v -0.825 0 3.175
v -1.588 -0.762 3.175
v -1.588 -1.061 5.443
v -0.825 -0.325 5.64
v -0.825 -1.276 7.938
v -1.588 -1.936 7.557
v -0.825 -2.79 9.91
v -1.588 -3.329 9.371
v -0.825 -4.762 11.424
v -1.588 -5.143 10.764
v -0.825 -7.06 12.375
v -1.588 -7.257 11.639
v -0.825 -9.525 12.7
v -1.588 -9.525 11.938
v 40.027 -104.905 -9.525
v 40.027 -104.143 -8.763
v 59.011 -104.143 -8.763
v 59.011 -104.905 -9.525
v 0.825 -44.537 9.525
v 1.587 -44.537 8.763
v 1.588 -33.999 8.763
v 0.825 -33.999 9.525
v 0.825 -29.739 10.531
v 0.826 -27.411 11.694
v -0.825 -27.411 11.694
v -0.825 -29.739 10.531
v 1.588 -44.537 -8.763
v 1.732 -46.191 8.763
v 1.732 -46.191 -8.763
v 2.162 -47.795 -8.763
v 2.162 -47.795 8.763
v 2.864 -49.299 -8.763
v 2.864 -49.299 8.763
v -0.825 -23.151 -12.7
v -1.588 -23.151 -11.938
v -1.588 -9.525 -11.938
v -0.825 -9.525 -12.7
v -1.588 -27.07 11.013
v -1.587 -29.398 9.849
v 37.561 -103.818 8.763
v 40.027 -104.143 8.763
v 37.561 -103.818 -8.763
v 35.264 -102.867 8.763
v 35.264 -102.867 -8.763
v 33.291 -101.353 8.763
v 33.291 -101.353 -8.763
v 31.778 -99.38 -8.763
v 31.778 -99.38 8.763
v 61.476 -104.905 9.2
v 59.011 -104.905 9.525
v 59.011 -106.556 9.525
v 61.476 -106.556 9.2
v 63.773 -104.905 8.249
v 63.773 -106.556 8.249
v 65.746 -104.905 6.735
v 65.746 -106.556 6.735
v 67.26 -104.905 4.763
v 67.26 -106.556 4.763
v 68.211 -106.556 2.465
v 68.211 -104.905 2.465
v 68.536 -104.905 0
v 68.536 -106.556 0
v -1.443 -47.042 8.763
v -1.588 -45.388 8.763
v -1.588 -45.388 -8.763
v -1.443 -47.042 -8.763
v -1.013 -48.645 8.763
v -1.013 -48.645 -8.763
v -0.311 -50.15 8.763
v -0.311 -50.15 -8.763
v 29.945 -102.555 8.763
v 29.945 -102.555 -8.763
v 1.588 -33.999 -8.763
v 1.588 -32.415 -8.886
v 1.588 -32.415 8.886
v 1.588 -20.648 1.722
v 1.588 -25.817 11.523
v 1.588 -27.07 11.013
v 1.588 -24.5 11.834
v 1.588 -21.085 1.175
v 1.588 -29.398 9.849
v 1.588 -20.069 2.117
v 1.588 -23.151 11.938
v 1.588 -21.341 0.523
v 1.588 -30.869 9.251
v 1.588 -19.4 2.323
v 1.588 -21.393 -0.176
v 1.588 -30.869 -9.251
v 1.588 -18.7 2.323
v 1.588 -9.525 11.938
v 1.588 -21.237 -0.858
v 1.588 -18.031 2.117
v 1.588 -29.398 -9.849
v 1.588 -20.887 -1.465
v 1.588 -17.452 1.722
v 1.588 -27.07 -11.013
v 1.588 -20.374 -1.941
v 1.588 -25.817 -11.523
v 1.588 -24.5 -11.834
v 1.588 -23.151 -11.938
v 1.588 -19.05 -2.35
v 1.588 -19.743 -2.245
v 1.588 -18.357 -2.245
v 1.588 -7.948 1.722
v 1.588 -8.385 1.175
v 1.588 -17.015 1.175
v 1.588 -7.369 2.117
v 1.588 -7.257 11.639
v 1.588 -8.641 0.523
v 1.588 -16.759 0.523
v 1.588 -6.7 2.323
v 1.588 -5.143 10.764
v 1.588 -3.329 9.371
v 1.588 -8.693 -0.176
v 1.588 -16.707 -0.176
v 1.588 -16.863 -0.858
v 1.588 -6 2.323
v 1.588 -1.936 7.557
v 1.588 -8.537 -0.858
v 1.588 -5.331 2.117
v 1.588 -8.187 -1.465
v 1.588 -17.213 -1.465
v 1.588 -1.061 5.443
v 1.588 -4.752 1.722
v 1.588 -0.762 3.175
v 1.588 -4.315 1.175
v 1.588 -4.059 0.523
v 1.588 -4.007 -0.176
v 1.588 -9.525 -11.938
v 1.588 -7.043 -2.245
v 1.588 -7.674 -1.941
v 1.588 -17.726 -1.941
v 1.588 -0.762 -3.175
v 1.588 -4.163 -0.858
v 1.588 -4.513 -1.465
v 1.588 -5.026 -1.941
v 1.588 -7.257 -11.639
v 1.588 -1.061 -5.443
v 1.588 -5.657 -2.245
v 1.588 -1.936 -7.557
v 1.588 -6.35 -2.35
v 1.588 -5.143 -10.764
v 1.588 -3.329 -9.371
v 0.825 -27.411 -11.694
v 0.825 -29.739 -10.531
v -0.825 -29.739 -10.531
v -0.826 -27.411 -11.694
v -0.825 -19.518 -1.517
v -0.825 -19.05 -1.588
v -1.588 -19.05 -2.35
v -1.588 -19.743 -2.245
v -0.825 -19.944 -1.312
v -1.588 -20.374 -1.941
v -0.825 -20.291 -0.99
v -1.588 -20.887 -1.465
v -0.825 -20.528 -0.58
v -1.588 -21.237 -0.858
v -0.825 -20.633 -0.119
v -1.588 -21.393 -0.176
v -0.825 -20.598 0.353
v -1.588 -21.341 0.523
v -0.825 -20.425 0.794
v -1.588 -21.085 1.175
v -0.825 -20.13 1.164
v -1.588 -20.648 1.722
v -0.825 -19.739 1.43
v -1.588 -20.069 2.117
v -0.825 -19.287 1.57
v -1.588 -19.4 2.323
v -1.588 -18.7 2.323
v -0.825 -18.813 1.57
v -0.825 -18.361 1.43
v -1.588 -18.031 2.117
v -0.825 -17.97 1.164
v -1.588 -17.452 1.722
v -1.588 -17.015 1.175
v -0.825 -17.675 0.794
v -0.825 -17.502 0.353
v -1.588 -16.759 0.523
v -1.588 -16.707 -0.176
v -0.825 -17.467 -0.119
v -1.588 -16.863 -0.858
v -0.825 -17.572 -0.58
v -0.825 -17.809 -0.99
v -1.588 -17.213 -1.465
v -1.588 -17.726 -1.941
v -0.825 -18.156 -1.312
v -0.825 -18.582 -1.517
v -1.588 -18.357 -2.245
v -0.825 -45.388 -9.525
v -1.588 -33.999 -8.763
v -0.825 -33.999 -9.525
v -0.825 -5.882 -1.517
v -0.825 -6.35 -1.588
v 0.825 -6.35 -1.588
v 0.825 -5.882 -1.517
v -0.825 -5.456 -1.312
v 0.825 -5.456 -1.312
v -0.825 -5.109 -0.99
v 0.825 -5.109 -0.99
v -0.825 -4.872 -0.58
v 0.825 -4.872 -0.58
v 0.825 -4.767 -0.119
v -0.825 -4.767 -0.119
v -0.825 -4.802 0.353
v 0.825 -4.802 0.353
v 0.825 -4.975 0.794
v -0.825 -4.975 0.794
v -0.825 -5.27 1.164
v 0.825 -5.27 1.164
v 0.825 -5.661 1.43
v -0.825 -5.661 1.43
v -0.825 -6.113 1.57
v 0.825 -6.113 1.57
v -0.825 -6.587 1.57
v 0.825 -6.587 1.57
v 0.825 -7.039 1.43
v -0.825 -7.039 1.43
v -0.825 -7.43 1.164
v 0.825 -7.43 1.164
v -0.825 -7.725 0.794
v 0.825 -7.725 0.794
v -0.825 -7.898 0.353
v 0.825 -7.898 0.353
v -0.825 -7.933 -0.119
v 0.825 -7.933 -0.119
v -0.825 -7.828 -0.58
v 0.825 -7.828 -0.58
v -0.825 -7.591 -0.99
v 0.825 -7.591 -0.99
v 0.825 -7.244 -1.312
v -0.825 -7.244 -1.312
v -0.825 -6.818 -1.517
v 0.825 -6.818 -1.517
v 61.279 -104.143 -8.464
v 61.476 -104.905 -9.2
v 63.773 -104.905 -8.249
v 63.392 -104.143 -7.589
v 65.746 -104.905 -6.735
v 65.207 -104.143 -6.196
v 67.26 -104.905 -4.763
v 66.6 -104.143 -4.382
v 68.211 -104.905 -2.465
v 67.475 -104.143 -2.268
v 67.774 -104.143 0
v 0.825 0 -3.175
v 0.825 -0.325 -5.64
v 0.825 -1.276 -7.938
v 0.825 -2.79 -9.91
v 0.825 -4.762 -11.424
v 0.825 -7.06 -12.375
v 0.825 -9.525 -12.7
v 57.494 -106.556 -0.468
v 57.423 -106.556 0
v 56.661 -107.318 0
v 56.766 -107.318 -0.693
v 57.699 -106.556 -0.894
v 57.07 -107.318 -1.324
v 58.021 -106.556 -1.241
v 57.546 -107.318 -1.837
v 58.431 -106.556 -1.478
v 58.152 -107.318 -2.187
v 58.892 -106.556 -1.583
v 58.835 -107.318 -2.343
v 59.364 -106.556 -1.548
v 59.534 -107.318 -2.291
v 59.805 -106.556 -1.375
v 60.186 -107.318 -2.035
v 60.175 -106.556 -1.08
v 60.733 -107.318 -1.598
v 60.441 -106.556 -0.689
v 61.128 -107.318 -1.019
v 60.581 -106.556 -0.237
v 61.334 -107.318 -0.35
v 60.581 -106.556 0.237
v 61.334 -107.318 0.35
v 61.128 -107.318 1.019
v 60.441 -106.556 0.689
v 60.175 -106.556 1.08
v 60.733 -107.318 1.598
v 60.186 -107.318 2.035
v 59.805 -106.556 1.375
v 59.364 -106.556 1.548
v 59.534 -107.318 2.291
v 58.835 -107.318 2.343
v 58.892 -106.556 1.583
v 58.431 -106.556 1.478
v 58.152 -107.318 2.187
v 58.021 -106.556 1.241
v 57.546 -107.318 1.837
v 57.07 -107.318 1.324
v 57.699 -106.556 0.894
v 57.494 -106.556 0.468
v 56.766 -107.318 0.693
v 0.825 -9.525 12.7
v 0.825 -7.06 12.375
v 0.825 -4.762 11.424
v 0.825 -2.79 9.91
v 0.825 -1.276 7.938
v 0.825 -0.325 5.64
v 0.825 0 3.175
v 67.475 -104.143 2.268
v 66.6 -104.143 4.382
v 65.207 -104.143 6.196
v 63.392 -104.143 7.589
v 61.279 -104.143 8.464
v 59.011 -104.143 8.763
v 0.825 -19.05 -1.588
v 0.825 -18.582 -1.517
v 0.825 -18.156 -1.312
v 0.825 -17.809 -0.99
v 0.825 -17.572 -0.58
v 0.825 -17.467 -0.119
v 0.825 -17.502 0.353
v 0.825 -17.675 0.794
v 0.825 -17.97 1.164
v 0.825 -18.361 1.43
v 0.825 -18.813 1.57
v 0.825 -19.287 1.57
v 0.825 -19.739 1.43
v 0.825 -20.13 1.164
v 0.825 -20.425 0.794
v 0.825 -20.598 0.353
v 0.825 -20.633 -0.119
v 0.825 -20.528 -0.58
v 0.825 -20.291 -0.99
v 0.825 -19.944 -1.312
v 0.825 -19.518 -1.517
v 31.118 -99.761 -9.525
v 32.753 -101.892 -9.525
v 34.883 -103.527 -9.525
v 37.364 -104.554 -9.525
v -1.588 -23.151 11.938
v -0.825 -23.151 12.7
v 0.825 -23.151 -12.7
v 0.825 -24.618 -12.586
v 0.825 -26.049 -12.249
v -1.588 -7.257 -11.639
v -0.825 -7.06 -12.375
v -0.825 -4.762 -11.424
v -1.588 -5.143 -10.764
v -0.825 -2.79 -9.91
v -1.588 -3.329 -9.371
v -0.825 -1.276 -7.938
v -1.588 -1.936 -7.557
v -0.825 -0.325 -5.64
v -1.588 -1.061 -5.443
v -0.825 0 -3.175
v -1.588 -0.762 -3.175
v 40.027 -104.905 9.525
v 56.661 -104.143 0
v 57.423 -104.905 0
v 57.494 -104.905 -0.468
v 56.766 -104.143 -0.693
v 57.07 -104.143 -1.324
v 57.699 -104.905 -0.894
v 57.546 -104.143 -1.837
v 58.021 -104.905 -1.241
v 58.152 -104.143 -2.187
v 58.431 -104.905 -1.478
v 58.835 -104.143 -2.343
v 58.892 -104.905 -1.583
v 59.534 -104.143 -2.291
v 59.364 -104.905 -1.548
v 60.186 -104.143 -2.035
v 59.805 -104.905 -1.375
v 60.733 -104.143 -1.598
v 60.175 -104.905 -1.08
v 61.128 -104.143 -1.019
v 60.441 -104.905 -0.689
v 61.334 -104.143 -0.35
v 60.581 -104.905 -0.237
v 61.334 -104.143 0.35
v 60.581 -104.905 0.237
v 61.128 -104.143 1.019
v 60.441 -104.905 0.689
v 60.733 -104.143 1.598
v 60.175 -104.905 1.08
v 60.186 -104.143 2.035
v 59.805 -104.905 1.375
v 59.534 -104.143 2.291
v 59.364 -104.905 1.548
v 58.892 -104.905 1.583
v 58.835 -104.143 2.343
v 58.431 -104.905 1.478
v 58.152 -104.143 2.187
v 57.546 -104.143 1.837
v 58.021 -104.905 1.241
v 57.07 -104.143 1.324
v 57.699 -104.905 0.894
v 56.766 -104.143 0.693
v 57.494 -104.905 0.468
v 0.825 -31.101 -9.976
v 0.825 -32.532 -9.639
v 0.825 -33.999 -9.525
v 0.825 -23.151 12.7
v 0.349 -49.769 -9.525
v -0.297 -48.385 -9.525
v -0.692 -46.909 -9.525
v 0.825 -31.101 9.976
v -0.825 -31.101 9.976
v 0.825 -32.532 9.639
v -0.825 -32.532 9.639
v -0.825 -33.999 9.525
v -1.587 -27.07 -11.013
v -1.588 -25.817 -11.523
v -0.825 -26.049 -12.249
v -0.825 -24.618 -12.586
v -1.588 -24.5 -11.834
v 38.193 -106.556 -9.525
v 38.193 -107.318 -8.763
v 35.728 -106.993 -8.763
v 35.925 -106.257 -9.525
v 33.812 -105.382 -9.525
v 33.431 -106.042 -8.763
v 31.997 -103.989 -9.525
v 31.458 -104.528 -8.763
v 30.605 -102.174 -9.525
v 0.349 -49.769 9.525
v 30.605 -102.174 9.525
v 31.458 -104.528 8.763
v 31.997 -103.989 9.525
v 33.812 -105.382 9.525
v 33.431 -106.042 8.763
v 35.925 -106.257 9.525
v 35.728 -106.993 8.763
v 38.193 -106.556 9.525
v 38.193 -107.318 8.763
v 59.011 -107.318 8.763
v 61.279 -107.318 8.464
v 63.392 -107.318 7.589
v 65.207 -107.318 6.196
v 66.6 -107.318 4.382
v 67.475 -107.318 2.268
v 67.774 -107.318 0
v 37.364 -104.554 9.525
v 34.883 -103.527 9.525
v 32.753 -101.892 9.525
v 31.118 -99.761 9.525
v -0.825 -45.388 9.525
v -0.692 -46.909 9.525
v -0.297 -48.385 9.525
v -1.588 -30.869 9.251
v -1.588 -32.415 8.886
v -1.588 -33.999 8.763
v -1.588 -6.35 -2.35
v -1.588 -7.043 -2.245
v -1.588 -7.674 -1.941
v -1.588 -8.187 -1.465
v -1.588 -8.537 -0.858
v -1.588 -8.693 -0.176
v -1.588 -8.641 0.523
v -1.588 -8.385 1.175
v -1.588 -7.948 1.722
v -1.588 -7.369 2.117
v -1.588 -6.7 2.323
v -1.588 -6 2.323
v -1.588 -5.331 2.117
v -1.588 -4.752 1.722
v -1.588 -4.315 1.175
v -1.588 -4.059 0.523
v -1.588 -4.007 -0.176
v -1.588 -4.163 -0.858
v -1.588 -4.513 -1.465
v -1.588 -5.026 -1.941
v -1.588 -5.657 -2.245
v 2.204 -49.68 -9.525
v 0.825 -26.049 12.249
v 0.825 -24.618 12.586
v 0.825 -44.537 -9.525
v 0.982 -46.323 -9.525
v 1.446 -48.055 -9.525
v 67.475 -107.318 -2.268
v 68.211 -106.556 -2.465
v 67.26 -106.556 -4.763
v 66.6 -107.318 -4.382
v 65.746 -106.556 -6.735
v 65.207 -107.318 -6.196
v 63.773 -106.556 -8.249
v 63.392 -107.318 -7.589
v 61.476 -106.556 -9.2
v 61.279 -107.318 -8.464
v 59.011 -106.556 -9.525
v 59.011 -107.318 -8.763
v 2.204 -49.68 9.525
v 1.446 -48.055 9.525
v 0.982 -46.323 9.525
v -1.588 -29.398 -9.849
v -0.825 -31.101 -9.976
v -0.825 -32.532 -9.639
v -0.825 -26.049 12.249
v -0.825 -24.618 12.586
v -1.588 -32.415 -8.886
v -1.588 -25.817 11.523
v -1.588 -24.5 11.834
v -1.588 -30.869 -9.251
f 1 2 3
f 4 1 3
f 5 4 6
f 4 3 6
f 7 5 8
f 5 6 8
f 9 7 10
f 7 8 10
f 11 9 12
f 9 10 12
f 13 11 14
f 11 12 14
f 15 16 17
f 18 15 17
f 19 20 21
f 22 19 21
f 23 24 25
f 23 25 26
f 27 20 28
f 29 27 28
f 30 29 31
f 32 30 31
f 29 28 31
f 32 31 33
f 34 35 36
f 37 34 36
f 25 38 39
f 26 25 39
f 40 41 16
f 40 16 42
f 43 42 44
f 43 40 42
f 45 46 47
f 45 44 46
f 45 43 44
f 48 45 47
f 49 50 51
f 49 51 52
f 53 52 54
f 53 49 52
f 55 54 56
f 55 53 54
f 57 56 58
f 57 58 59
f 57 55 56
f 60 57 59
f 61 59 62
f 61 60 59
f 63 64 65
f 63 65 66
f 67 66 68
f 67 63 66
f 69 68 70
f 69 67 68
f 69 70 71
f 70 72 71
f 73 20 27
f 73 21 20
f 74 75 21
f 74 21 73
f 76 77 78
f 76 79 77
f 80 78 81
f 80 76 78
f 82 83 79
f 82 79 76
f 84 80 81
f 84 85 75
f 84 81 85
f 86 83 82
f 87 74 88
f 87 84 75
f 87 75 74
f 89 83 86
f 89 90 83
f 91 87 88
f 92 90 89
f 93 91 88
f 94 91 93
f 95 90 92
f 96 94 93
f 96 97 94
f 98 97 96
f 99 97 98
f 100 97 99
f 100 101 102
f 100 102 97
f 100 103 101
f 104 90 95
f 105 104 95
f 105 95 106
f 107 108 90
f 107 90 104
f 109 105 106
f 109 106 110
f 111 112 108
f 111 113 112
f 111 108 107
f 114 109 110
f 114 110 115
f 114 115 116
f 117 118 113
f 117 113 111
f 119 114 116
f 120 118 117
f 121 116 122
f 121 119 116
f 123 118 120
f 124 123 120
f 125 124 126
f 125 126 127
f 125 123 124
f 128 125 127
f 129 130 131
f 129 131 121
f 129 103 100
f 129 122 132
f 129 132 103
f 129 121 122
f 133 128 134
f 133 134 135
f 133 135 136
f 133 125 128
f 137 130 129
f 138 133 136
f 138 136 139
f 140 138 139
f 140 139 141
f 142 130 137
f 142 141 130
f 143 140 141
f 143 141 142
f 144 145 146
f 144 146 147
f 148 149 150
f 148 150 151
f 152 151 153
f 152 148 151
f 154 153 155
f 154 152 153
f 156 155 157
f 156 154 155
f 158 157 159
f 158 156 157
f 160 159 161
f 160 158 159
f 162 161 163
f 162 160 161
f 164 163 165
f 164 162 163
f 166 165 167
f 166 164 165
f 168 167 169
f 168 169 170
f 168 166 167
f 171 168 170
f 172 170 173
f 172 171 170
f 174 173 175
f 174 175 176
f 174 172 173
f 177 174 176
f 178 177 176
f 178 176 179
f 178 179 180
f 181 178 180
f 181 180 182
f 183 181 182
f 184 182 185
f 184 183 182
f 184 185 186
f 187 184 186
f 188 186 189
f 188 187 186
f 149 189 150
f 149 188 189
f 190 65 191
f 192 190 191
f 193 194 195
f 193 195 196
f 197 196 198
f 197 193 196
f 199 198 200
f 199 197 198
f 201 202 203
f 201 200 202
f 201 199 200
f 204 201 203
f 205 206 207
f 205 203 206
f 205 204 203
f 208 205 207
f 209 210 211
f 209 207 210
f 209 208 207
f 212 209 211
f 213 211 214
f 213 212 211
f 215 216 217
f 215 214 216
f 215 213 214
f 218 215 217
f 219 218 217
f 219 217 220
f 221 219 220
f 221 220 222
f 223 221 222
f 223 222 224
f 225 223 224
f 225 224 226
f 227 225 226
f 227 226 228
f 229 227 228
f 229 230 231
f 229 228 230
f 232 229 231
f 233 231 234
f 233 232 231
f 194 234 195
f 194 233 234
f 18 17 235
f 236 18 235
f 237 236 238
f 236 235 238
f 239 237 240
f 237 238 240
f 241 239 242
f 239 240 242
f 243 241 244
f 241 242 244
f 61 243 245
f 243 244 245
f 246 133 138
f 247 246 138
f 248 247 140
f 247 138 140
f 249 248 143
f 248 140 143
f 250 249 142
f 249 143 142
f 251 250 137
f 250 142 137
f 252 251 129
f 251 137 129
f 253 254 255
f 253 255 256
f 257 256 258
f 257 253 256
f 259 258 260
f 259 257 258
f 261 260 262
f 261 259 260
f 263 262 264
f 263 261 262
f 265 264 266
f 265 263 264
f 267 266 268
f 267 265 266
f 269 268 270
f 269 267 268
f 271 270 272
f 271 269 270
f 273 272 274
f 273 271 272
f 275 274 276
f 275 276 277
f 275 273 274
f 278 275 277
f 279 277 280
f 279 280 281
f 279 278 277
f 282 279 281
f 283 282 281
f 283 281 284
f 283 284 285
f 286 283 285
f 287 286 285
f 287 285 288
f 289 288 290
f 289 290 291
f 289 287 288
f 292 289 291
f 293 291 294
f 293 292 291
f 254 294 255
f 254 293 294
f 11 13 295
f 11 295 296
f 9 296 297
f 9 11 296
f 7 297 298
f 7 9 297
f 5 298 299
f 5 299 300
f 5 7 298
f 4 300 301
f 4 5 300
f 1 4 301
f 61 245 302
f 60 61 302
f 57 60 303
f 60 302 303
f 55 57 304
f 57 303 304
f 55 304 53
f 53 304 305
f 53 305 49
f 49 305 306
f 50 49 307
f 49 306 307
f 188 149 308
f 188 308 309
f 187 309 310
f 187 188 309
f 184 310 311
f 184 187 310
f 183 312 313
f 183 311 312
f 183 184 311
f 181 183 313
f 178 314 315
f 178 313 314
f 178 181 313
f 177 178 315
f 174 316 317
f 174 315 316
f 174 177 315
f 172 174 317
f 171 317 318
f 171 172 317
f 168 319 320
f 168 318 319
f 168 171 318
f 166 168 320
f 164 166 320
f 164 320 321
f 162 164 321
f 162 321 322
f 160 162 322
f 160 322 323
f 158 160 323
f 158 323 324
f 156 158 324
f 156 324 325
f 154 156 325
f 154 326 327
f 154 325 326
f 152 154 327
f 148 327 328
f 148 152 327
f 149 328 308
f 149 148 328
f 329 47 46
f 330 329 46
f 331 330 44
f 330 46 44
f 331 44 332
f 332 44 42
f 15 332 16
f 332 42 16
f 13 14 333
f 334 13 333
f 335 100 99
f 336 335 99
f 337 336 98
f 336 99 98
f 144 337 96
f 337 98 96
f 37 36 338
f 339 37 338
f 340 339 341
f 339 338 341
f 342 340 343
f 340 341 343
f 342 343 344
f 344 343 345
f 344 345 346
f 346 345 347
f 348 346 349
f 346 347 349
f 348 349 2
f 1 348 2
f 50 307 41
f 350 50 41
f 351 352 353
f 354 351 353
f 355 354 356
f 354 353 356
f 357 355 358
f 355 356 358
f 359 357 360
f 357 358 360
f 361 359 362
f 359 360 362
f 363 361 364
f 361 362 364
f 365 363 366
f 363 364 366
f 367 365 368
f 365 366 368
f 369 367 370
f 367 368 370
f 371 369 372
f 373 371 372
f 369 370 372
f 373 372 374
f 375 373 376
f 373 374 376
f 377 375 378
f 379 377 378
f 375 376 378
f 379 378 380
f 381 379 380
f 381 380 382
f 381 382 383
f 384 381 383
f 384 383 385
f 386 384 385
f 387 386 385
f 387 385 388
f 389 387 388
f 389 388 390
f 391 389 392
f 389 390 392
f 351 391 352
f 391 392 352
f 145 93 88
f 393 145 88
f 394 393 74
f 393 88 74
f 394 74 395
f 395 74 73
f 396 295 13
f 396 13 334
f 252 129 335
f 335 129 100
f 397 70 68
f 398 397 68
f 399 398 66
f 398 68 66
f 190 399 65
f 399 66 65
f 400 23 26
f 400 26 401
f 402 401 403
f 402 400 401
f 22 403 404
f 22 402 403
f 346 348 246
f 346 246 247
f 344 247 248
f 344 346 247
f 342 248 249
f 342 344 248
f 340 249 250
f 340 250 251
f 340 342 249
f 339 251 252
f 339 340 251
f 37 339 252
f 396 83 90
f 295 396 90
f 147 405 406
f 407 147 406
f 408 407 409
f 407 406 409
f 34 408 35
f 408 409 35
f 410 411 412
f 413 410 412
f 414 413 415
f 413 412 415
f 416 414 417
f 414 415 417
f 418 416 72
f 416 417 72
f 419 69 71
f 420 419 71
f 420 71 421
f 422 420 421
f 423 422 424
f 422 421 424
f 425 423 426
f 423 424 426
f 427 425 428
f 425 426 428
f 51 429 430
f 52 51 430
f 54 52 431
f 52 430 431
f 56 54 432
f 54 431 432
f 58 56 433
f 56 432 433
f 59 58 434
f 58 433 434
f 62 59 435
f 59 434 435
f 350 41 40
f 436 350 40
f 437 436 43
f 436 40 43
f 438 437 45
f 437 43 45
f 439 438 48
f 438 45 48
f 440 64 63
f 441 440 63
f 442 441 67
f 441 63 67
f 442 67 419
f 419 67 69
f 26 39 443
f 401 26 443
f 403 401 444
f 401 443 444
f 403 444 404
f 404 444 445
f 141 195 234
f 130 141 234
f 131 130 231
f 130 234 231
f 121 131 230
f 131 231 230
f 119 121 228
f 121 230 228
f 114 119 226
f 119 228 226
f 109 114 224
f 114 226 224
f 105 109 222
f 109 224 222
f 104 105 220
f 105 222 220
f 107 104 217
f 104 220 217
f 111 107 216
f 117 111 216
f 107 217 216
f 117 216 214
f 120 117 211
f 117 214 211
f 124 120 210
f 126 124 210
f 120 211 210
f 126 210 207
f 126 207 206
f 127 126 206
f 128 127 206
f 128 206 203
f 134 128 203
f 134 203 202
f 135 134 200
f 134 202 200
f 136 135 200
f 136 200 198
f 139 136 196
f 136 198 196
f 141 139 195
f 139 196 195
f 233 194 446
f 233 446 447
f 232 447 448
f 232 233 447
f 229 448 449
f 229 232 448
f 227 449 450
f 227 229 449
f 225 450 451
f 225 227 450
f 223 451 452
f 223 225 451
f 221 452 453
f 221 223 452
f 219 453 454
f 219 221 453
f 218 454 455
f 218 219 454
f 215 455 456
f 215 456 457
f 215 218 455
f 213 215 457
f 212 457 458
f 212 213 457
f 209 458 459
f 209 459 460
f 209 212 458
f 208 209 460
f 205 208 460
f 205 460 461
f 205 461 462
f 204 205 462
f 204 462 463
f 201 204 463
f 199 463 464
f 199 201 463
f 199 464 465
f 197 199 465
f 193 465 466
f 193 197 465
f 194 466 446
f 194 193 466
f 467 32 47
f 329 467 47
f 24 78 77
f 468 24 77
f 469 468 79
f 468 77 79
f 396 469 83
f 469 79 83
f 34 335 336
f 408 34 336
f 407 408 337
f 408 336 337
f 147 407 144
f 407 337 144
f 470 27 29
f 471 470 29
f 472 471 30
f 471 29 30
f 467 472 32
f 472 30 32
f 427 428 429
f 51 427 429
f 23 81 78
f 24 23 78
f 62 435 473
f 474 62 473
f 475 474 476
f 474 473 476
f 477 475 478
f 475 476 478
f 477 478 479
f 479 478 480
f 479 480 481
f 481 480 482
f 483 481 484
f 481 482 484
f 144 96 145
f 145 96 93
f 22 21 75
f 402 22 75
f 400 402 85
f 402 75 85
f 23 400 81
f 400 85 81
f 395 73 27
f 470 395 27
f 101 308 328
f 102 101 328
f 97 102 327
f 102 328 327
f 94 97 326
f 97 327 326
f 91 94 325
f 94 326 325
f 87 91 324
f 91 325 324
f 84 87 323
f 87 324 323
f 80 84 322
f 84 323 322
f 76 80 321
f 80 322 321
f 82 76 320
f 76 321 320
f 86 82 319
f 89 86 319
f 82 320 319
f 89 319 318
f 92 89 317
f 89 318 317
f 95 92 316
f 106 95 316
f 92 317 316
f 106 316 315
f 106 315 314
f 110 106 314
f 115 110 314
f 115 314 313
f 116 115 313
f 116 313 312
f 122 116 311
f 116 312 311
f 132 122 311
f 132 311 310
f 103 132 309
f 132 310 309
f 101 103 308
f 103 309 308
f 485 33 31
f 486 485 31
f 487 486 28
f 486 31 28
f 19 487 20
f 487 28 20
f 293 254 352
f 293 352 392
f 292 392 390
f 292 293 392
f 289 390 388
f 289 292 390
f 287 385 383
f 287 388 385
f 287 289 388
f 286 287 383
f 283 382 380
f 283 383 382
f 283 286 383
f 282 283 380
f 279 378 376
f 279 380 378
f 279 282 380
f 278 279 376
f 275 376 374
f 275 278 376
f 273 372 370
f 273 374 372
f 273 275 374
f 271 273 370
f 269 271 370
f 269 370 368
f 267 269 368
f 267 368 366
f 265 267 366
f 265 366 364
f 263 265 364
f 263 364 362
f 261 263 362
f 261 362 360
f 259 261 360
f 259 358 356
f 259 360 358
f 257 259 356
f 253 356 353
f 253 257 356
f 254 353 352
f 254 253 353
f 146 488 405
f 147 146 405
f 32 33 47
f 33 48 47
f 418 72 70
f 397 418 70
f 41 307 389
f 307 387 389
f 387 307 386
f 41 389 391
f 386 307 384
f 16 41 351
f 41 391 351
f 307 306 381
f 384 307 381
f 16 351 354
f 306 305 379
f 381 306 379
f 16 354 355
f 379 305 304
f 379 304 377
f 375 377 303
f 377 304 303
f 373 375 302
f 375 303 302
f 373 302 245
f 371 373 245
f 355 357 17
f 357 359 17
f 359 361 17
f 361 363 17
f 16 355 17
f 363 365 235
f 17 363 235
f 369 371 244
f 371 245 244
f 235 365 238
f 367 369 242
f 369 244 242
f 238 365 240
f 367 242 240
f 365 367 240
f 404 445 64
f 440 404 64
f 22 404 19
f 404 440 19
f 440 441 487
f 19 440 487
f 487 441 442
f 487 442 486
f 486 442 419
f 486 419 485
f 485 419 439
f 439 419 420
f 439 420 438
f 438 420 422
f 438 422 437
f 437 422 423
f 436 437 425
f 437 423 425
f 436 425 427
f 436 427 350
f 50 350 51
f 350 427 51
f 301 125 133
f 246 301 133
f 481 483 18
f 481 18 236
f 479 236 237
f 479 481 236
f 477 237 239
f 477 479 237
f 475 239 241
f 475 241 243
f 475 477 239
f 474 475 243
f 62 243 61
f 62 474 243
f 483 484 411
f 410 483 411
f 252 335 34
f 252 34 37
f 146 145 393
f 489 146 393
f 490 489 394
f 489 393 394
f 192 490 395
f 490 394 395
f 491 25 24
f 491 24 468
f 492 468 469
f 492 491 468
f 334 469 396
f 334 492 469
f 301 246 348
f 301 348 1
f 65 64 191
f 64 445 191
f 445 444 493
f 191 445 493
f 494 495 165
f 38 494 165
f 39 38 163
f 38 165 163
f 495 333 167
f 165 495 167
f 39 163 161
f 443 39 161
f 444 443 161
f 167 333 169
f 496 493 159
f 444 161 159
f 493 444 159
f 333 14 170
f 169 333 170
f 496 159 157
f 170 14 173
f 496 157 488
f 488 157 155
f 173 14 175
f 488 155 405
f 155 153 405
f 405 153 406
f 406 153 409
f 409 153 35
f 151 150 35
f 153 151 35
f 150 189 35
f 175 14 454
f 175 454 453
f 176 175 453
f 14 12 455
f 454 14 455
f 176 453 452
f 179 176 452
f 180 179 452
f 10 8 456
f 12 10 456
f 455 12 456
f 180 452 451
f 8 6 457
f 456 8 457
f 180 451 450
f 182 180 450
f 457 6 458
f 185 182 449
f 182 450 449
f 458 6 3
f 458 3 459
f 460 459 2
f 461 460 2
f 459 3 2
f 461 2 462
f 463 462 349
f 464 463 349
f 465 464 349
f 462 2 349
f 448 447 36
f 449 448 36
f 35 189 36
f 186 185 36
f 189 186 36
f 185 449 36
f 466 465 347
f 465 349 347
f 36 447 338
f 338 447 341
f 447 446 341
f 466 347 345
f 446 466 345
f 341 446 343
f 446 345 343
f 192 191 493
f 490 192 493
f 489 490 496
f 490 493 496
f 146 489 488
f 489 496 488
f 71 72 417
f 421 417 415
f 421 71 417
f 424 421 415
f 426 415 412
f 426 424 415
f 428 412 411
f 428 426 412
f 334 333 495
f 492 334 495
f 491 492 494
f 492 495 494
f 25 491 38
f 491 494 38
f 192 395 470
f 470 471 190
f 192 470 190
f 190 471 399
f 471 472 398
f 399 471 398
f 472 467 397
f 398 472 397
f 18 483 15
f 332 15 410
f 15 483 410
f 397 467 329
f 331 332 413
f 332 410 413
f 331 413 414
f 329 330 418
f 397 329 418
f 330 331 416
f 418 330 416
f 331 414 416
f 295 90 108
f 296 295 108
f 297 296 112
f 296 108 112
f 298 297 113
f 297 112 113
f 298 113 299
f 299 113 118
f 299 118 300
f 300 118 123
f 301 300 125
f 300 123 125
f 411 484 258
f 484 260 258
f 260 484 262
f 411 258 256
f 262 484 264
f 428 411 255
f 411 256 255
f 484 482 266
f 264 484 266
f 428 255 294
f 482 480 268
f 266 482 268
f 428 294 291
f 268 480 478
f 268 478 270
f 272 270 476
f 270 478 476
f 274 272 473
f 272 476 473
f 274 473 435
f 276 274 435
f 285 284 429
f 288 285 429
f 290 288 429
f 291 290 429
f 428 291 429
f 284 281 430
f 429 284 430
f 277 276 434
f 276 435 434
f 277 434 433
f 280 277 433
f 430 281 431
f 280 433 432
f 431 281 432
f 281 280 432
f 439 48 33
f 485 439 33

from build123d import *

# Parameters (mm, degrees)
SKETCH2_W               = 3.175
SKETCH2_H               = 19.05
BOSS_EXTRUDE1_DEPTH     = 1.5875
CUT_EXTRUDE1_DEPTH      = 128.966941084
CUT_EXTRUDE1_DEPTH_BACK = 128.966941084
SKETCH8_R               = 1.5875
CUT_EXTRUDE2_DEPTH      = 126.316205076
CUT_EXTRUDE2_DEPTH_BACK = 126.316205076
SKETCH9_R               = 1.5875
FILLET1_R               = 9.525
CHAMFER1_SIZE           = 0.762


with BuildPart() as part:
    # Sweep1: sweep along a path in Sketch1
    with BuildLine(Plane.XY) as sweep1_path:
        Line((0, 0), (0, -47.5145354))
        Line((0, -47.5145354), (33.61082832, -105.730197734))
        Line((33.61082832, -105.730197734), (68.53582832, -105.730197734))
    # Sketch2 → Sweep1 (sweep)
    with BuildSketch(Plane(origin=(0, 0, 0), x_dir=(1, 0, 0), z_dir=(0, 1, 0))):
        Rectangle(SKETCH2_W, SKETCH2_H)
    sweep(path=sweep1_path.line, transition=Transition.RIGHT)

    # Sketch7 → Boss-Extrude1 (add, symmetric)
    with BuildSketch(Plane(origin=(0, 0, 0), x_dir=(0, 0, -1), z_dir=(1, 0, 0))):
        Polygon((-12.7, -25.4), (-9.525, -31.75), (9.525, -31.75), (12.7, -25.4), (12.7, 0), (-12.7, 0), align=None)
    extrude(amount=BOSS_EXTRUDE1_DEPTH, both=True)

    # Sketch8 → Cut-Extrude1 (cut, two sides: drawn at the far end of the back side and taken through both)
    with BuildSketch(Plane(origin=(0, 0, 0), x_dir=(0, 0, -1), z_dir=(1, 0, 0)).offset(-CUT_EXTRUDE1_DEPTH_BACK)):
        with Locations((0, -6.35)):
            Circle(SKETCH8_R)
        with Locations((0, -19.05)):
            Circle(SKETCH8_R)
    extrude(amount=CUT_EXTRUDE1_DEPTH + CUT_EXTRUDE1_DEPTH_BACK, mode=Mode.SUBTRACT)

    # Sketch9 → Cut-Extrude2 (cut, two sides: drawn at the far end of the back side and taken through both)
    with BuildSketch(Plane(origin=(0, -104.142697734, 0), x_dir=(1, 0, 0), z_dir=(0, 1, 0)).offset(-CUT_EXTRUDE2_DEPTH_BACK)):
        with Locations(Location((59.01082832, 0, 0), (0, 0, 180))):
            Circle(SKETCH9_R)
    extrude(amount=CUT_EXTRUDE2_DEPTH + CUT_EXTRUDE2_DEPTH_BACK, mode=Mode.SUBTRACT)

    # Fillet1
    fillet1_edges = [part.edges().sort_by_distance(p)[0] for p in [
        (0, -31.75, -9.525),
        (0, -25.4, -12.7),
        (0, -31.75, 9.525),
        (0, -25.4, 12.7),
        (0, 0, -12.7),
        (0, 0, 12.7),
        (68.53582832, -105.730197734, -9.525),
        (68.53582832, -105.730197734, 9.525),
        (1.5875, -47.089166057, 0),
        (-1.5875, -47.939904743, 0),
        (32.694284767, -107.317697734, 0),
        (34.527371872, -104.142697734, 0),
    ]]
    fillet(fillet1_edges, radius=FILLET1_R - 0.0001)  # a hair under: the kernel refuses the full size

    # Chamfer1
    chamfer1_edges = [part.edges().sort_by_distance(p)[0] for p in [
        (14.816638805, -76.352706607, 9.525),
        (14.816638805, -76.352706607, -9.525),
        (33.431038346, -106.041603103, -9.525),
        (-1.262946903, -47.852941003, -9.525),
        (-1.5875, -39.693119679, -9.525),
        (-1.262946903, -47.852941003, -9.525),
        (-1.5875, 0, 0),
        (-1.5875, -16.338188061, -12.7),
        (-1.5875, -28.575, -11.1125),
        (-1.5875, -39.693119679, 9.525),
        (-1.5875, -28.575, 11.1125),
        (-1.5875, -16.338188061, 12.7),
        (-1.5875, -2.78977862, 9.91022138),
        (-1.5875, -2.78977862, -9.91022138),
        (-1.5875, -25.339849714, 12.4451993),
        (-1.5875, -25.339849714, -12.4451993),
        (-1.262946903, -47.852941003, 9.525),
        (33.431038346, -106.041603103, 9.525),
        (-1.262946903, -47.852941003, 9.525),
        (48.602208333, -107.317697734, -9.525),
        (48.602208333, -107.317697734, 9.525),
        (65.7460497, -107.317697734, 6.73522138),
        (65.7460497, -107.317697734, -6.73522138),
        (49.518751885, -104.142697734, -9.525),
        (33.431038346, -106.041603103, -9.525),
        (49.518751885, -104.142697734, 9.525),
        (33.431038346, -106.041603103, 9.525),
        (65.7460497, -104.142697734, 6.73522138),
        (65.7460497, -104.142697734, -6.73522138),
        (1.912053097, -47.002202317, 9.525),
        (1.912053097, -47.002202317, 9.525),
        (1.912053097, -47.002202317, -9.525),
        (1.912053097, -47.002202317, -9.525),
        (35.264125451, -102.866603103, 9.525),
        (35.264125451, -102.866603103, 9.525),
        (35.264125451, -102.866603103, -9.525),
        (35.264125451, -102.866603103, -9.525),
        (-1.5875, -31.810150286, -9.7798007),
        (1.5875, -31.810150286, -9.7798007),
        (-1.5875, -31.810150286, 9.7798007),
        (1.5875, -31.810150286, 9.7798007),
        (-1.5875, -6.35, 1.5875),
        (1.5875, -6.35, 1.5875),
        (-1.5875, -19.05, 1.5875),
        (1.5875, -19.05, 1.5875),
        (60.59832832, -107.317697734, 0),
        (60.59832832, -104.142697734, 0),
        (17.320682357, -74.339837264, -9.525),
        (17.320682357, -74.339837264, 9.525),
        (1.5875, 0, 0),
        (1.5875, -16.338188061, 12.7),
        (1.5875, -28.575, 11.1125),
        (1.5875, -39.267750336, 9.525),
        (1.5875, -39.267750336, -9.525),
        (1.5875, -28.575, -11.1125),
        (1.5875, -16.338188061, -12.7),
        (1.5875, -2.78977862, 9.91022138),
        (1.5875, -2.78977862, -9.91022138),
        (1.5875, -25.339849714, 12.4451993),
        (1.5875, -25.339849714, -12.4451993),
    ]]
    chamfer(chamfer1_edges, length=CHAMFER1_SIZE)


solid = part.part
